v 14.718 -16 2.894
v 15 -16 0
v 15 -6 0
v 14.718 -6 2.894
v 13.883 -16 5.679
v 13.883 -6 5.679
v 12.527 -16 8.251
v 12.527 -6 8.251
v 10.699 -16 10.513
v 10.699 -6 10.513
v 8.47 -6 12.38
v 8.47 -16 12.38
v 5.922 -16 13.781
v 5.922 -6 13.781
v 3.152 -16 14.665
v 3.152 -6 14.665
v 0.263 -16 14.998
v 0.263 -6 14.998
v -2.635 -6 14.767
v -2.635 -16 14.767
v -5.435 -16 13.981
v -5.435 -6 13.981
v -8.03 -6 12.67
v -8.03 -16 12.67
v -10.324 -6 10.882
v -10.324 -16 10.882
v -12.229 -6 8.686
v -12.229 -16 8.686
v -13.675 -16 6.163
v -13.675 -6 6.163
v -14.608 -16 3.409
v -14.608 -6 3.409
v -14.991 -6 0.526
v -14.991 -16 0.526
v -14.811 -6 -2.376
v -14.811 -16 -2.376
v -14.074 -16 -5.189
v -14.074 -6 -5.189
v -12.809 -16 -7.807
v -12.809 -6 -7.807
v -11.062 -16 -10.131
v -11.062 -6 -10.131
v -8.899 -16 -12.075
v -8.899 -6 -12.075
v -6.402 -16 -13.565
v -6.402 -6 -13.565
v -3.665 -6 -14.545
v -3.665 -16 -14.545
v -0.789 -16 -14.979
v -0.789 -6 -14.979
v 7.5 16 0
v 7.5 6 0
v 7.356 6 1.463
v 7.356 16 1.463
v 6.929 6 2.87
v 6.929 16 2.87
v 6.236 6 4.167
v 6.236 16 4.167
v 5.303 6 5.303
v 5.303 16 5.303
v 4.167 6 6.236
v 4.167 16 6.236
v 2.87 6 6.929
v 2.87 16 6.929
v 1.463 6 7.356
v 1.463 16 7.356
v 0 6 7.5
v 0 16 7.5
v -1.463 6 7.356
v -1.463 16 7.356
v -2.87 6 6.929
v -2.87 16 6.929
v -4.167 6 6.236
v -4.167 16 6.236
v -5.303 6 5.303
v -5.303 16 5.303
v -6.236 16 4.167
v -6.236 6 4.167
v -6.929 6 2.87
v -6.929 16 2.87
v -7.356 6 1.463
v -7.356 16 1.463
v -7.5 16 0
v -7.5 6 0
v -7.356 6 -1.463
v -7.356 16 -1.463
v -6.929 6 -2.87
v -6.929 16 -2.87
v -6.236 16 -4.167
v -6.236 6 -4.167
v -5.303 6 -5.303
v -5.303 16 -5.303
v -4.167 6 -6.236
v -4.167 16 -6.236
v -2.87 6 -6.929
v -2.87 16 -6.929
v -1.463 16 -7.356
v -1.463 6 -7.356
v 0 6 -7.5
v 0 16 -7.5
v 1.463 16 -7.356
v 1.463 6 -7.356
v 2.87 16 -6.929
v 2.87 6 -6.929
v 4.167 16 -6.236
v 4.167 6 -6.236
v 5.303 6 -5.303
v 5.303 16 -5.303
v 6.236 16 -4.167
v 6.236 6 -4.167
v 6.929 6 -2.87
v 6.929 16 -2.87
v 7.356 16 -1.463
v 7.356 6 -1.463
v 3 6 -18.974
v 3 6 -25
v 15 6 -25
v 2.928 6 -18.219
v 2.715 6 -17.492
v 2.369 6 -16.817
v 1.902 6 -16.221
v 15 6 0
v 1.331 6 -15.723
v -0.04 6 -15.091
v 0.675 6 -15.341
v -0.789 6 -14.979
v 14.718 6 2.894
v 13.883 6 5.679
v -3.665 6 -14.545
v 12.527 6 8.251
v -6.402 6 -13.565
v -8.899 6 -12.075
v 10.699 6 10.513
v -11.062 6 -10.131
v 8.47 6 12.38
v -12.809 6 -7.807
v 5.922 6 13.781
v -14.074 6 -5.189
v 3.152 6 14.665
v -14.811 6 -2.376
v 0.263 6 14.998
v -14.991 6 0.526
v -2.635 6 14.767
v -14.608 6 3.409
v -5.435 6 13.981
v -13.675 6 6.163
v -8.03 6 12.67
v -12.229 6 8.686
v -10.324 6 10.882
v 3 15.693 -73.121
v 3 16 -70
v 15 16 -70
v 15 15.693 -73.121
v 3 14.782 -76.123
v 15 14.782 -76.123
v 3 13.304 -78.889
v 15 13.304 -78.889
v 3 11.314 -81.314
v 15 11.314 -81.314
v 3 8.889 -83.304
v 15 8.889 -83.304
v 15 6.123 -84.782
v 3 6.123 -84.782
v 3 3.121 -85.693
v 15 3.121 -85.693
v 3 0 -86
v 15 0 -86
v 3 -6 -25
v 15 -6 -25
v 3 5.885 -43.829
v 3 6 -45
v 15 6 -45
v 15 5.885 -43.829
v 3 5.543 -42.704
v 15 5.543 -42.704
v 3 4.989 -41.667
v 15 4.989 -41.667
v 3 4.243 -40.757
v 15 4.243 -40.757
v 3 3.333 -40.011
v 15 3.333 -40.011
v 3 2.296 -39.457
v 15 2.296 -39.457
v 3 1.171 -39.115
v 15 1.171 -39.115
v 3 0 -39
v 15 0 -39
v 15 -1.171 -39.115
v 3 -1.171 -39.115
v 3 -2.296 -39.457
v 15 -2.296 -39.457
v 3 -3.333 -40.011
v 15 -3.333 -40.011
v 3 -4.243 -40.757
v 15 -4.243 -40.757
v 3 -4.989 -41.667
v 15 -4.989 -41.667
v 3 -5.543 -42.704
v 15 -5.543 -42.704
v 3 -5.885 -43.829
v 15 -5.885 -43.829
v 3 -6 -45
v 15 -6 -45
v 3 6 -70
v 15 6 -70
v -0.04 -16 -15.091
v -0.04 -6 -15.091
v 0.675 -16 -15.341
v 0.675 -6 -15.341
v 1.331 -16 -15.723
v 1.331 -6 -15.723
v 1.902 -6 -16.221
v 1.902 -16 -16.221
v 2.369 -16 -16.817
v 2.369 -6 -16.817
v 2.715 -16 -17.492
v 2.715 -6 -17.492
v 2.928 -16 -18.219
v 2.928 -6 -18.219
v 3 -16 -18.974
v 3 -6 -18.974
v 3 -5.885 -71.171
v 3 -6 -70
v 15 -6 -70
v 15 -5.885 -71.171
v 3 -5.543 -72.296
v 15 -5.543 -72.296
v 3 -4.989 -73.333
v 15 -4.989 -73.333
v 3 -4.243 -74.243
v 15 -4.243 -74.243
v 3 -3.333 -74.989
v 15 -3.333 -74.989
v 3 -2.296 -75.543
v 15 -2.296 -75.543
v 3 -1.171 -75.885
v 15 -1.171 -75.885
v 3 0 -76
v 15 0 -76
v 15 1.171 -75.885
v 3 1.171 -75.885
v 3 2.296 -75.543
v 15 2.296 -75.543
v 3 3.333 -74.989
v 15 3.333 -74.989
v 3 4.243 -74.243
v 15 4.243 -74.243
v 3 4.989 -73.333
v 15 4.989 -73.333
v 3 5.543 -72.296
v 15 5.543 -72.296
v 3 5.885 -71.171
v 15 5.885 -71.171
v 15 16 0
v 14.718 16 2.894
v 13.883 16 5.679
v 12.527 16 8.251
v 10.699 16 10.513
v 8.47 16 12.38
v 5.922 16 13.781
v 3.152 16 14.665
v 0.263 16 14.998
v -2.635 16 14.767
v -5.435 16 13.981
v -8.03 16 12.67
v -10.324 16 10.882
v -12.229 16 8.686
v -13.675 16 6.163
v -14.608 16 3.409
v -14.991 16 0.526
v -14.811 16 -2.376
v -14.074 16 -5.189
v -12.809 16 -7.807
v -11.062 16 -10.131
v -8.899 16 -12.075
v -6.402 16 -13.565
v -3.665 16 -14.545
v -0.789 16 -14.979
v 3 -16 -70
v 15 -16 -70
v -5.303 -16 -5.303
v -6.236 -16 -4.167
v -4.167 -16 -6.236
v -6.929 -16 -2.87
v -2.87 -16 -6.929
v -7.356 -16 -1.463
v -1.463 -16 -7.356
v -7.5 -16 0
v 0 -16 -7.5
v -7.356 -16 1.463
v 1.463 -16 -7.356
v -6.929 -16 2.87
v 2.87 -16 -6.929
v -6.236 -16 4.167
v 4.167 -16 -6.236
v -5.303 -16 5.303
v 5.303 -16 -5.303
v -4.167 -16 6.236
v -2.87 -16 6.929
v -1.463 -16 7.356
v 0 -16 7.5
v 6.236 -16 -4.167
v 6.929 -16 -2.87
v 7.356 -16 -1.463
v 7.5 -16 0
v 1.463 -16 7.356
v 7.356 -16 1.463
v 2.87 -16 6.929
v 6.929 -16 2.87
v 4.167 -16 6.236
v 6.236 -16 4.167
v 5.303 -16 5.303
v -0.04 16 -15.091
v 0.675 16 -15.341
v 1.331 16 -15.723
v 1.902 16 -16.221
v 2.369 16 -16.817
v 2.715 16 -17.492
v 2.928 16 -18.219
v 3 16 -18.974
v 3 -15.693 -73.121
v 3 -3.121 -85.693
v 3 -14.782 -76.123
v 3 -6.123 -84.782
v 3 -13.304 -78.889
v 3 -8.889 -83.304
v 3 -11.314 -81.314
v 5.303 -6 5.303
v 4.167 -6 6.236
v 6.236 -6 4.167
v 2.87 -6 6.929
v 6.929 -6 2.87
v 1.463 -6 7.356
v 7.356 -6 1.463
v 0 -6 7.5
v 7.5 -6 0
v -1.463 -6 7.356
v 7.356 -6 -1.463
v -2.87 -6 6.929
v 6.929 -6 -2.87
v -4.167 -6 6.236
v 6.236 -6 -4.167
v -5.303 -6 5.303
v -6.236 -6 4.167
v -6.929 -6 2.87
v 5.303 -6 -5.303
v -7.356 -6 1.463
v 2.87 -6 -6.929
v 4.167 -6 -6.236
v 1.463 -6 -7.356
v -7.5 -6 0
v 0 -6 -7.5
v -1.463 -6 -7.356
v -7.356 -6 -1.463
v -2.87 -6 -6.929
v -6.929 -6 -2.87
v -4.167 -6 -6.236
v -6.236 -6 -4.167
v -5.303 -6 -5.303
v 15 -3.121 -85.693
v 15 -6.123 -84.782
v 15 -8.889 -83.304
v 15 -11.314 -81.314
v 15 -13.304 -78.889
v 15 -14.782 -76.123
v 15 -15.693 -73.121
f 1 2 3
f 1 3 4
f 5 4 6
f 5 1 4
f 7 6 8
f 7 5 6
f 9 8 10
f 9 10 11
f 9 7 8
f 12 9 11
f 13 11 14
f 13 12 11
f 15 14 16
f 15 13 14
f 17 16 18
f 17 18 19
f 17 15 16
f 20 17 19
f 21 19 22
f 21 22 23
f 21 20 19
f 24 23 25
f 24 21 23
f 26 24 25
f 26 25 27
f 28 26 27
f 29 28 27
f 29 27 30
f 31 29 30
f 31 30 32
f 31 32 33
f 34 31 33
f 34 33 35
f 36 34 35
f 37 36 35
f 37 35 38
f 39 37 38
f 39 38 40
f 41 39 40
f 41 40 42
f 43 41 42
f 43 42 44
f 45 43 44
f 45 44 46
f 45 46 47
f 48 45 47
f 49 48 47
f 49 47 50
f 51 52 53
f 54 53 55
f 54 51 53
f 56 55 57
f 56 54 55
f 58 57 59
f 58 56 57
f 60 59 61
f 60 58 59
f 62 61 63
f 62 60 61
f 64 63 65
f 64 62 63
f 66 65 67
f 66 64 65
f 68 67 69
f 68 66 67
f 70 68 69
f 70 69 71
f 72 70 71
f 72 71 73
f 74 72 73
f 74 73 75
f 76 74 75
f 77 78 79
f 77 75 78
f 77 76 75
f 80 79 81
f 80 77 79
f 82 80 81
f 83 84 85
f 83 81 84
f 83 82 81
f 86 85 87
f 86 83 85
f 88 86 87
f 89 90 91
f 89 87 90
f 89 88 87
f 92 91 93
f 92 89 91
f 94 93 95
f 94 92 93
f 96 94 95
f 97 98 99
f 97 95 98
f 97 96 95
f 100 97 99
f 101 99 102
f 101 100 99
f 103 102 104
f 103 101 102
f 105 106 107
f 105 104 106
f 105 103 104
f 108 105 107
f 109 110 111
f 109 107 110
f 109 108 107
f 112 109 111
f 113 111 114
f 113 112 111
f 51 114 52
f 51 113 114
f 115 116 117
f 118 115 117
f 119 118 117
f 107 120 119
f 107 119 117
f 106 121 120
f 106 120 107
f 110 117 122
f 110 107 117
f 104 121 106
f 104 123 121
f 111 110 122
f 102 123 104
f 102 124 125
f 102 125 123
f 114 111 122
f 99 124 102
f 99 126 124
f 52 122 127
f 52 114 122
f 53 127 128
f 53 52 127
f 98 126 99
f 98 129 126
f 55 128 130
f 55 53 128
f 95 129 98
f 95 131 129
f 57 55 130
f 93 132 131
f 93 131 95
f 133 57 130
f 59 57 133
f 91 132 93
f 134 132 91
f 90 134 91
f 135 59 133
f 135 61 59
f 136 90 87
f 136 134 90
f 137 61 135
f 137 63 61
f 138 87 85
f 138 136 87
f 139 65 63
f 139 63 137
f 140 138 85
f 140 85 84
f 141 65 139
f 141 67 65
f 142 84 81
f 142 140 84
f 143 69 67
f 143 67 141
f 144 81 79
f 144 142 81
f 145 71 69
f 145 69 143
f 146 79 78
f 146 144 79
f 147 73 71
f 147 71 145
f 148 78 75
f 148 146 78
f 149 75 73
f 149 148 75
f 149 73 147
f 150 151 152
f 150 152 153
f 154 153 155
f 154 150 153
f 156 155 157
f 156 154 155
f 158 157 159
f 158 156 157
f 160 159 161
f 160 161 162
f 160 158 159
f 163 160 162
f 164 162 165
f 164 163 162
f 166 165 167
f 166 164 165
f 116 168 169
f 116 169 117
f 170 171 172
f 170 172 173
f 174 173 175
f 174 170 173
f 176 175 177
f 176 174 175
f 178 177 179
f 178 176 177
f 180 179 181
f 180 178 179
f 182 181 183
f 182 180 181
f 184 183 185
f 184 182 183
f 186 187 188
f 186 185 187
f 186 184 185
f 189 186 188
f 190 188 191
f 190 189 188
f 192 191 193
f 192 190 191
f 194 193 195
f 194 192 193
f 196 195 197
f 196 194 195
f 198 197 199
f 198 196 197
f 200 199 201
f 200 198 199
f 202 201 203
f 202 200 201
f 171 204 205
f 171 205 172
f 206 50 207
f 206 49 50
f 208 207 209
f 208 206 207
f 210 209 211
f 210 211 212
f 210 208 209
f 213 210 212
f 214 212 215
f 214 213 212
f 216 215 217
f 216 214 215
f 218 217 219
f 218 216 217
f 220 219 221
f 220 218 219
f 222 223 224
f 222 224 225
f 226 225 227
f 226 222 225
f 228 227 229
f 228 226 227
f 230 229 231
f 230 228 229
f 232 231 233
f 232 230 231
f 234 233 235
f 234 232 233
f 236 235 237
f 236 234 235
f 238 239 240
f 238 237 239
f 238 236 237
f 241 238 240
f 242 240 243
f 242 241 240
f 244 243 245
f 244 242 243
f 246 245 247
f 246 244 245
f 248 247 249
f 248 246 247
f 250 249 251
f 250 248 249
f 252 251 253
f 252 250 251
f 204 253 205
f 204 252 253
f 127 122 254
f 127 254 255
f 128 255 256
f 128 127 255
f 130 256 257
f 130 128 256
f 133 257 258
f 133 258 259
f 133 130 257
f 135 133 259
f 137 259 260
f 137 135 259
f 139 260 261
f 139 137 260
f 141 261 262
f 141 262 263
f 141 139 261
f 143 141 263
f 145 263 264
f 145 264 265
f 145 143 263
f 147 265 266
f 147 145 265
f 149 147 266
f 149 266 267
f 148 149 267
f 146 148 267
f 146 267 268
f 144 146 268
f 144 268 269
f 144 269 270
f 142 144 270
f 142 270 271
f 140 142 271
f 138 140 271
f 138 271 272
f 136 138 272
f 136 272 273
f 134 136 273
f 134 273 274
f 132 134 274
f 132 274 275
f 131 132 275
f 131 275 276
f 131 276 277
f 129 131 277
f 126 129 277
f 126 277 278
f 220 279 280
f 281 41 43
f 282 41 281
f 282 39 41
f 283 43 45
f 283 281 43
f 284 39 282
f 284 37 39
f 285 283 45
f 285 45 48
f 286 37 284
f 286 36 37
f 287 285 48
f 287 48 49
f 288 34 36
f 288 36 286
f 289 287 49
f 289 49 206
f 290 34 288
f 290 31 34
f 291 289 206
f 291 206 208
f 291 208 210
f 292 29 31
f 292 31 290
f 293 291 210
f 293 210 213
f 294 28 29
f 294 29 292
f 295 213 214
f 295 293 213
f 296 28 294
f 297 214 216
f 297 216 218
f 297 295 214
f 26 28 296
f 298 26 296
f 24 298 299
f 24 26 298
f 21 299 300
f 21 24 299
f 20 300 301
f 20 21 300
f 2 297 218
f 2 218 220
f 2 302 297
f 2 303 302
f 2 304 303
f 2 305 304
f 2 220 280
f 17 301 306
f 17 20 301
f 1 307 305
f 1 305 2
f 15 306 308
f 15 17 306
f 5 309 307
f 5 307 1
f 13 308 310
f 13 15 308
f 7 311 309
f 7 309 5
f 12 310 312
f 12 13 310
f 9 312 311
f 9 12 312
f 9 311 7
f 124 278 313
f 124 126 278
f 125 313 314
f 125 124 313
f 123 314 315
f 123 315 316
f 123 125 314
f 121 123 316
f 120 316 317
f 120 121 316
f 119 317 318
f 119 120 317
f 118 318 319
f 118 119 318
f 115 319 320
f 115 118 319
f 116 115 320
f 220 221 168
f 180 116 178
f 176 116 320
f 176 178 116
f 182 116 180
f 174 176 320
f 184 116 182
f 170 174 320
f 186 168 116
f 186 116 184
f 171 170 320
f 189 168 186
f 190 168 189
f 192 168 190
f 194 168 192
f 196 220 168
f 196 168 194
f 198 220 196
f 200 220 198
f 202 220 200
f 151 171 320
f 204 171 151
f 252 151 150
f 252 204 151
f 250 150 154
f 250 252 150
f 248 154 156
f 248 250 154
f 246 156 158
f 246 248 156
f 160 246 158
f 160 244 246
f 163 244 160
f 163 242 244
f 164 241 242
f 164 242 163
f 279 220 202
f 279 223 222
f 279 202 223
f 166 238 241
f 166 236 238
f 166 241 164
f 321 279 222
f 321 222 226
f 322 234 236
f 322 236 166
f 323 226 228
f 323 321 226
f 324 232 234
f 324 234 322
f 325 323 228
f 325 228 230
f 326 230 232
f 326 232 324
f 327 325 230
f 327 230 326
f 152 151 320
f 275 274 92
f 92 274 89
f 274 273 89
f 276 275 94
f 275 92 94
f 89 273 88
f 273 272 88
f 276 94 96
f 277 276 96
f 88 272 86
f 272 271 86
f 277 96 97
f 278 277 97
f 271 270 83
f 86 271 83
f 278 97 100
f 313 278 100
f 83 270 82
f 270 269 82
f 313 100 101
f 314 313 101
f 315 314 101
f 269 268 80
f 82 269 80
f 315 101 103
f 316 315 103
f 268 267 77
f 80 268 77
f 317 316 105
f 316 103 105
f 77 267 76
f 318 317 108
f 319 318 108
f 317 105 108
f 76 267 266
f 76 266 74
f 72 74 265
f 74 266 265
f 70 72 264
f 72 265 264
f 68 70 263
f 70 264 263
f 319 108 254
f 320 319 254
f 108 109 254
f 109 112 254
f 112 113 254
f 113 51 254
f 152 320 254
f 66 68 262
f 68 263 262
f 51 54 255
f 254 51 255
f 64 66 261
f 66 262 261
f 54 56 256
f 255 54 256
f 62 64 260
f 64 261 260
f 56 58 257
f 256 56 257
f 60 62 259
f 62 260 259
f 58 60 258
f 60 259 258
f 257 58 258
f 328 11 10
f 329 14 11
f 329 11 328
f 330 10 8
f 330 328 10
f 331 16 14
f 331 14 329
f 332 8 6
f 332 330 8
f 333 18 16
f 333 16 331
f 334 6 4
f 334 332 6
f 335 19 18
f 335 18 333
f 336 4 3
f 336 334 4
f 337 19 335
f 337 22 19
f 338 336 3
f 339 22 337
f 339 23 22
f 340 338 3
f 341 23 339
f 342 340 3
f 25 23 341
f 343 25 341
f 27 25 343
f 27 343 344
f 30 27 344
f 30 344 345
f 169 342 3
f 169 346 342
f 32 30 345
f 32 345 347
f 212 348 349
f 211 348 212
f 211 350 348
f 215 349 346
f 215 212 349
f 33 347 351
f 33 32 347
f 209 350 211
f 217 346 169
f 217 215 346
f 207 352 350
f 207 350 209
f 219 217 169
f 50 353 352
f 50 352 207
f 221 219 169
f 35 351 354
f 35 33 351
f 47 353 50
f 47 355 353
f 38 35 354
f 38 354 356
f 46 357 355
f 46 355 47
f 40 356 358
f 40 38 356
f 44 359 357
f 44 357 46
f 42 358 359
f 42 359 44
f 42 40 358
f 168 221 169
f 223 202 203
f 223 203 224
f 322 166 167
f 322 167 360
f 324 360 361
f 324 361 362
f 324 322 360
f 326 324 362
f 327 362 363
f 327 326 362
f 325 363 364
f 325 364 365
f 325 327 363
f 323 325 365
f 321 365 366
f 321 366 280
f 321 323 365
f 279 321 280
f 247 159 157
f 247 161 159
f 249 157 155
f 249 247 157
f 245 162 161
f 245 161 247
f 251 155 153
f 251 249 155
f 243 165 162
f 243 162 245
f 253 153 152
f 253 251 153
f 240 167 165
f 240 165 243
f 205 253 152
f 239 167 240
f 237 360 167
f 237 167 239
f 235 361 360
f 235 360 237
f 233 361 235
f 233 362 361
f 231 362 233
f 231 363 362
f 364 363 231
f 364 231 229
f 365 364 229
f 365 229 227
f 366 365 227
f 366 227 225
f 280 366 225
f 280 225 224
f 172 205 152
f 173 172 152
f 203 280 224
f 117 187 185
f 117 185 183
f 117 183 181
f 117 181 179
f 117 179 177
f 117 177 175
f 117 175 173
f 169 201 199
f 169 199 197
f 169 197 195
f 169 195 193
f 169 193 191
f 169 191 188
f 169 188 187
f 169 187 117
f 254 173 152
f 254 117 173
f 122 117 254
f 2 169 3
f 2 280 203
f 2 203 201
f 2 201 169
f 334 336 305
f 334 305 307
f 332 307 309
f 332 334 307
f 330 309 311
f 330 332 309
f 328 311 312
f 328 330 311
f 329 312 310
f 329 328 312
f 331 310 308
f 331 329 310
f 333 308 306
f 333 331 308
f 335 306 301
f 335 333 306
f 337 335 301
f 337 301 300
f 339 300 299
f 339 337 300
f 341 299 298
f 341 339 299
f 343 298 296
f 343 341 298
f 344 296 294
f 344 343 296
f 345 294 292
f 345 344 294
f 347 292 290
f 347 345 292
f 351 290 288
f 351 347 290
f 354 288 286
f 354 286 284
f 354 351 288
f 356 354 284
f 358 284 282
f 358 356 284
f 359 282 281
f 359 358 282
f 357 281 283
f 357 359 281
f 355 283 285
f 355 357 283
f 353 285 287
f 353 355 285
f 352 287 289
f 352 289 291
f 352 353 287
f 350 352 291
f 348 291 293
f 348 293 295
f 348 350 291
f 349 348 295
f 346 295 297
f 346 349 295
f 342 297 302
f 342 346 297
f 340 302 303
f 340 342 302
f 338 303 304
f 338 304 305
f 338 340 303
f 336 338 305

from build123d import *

# Parameters (mm, degrees)
F0_R     = 7.5
F1_DEPTH = 16
F3_W     = 12
F3_H     = 39.696938
F3_H_2   = 10.303062
F4_DEPTH = 40.001
F5_R     = 4


with BuildPart() as f1:
    # F0 (on Front) → F1 (new body, symmetric)
    with BuildSketch(Plane.XZ):
        with BuildLine():
            Line((15, -86), (15, 0))
            ThreePointArc((15, 0), (-11.61895, 9.486833), (3, -14.696938))
            Line((3, -14.696938), (3, -86))
            Line((3, -86), (15, -86))
        make_face()
        Circle(F0_R, mode=Mode.SUBTRACT)
    extrude(amount=F1_DEPTH, both=True)

    # F3 (on offset) → F4 (cut, through all)
    with BuildSketch(Plane.YZ.offset(-25)):
        with Locations((0, 5.151531)):
            Rectangle(F3_W, F3_H)
        with Locations((0, -19.848469)):
            Rectangle(F3_W, F3_H_2)
        with BuildLine():
            ThreePointArc((0, -86), (-11.313709, -81.313708), (-16, -70))
            Line((-16, -70), (-16, -86))
            Line((-16, -86), (0, -86))
        make_face()
        with BuildLine():
            Line((16, -86), (16, -70))
            ThreePointArc((16, -70), (11.313708, -81.313709), (0, -86))
            Line((0, -86), (16, -86))
        make_face()
        with BuildLine():
            Line((6, -70), (6, -45))
            ThreePointArc((6, -45), (0, -39), (-6, -45))
            Line((-6, -45), (-6, -70))
            ThreePointArc((-6, -70), (0, -76), (6, -70))
        make_face()
    extrude(amount=F4_DEPTH, mode=Mode.SUBTRACT)

    # F5
    f5_edges = [f1.edges().sort_by_distance(p)[0] for p in [
        (3, 11, -14.696938),
        (3, -11, -14.696938),
    ]]
    fillet(f5_edges, radius=F5_R)


solid = f1.part
